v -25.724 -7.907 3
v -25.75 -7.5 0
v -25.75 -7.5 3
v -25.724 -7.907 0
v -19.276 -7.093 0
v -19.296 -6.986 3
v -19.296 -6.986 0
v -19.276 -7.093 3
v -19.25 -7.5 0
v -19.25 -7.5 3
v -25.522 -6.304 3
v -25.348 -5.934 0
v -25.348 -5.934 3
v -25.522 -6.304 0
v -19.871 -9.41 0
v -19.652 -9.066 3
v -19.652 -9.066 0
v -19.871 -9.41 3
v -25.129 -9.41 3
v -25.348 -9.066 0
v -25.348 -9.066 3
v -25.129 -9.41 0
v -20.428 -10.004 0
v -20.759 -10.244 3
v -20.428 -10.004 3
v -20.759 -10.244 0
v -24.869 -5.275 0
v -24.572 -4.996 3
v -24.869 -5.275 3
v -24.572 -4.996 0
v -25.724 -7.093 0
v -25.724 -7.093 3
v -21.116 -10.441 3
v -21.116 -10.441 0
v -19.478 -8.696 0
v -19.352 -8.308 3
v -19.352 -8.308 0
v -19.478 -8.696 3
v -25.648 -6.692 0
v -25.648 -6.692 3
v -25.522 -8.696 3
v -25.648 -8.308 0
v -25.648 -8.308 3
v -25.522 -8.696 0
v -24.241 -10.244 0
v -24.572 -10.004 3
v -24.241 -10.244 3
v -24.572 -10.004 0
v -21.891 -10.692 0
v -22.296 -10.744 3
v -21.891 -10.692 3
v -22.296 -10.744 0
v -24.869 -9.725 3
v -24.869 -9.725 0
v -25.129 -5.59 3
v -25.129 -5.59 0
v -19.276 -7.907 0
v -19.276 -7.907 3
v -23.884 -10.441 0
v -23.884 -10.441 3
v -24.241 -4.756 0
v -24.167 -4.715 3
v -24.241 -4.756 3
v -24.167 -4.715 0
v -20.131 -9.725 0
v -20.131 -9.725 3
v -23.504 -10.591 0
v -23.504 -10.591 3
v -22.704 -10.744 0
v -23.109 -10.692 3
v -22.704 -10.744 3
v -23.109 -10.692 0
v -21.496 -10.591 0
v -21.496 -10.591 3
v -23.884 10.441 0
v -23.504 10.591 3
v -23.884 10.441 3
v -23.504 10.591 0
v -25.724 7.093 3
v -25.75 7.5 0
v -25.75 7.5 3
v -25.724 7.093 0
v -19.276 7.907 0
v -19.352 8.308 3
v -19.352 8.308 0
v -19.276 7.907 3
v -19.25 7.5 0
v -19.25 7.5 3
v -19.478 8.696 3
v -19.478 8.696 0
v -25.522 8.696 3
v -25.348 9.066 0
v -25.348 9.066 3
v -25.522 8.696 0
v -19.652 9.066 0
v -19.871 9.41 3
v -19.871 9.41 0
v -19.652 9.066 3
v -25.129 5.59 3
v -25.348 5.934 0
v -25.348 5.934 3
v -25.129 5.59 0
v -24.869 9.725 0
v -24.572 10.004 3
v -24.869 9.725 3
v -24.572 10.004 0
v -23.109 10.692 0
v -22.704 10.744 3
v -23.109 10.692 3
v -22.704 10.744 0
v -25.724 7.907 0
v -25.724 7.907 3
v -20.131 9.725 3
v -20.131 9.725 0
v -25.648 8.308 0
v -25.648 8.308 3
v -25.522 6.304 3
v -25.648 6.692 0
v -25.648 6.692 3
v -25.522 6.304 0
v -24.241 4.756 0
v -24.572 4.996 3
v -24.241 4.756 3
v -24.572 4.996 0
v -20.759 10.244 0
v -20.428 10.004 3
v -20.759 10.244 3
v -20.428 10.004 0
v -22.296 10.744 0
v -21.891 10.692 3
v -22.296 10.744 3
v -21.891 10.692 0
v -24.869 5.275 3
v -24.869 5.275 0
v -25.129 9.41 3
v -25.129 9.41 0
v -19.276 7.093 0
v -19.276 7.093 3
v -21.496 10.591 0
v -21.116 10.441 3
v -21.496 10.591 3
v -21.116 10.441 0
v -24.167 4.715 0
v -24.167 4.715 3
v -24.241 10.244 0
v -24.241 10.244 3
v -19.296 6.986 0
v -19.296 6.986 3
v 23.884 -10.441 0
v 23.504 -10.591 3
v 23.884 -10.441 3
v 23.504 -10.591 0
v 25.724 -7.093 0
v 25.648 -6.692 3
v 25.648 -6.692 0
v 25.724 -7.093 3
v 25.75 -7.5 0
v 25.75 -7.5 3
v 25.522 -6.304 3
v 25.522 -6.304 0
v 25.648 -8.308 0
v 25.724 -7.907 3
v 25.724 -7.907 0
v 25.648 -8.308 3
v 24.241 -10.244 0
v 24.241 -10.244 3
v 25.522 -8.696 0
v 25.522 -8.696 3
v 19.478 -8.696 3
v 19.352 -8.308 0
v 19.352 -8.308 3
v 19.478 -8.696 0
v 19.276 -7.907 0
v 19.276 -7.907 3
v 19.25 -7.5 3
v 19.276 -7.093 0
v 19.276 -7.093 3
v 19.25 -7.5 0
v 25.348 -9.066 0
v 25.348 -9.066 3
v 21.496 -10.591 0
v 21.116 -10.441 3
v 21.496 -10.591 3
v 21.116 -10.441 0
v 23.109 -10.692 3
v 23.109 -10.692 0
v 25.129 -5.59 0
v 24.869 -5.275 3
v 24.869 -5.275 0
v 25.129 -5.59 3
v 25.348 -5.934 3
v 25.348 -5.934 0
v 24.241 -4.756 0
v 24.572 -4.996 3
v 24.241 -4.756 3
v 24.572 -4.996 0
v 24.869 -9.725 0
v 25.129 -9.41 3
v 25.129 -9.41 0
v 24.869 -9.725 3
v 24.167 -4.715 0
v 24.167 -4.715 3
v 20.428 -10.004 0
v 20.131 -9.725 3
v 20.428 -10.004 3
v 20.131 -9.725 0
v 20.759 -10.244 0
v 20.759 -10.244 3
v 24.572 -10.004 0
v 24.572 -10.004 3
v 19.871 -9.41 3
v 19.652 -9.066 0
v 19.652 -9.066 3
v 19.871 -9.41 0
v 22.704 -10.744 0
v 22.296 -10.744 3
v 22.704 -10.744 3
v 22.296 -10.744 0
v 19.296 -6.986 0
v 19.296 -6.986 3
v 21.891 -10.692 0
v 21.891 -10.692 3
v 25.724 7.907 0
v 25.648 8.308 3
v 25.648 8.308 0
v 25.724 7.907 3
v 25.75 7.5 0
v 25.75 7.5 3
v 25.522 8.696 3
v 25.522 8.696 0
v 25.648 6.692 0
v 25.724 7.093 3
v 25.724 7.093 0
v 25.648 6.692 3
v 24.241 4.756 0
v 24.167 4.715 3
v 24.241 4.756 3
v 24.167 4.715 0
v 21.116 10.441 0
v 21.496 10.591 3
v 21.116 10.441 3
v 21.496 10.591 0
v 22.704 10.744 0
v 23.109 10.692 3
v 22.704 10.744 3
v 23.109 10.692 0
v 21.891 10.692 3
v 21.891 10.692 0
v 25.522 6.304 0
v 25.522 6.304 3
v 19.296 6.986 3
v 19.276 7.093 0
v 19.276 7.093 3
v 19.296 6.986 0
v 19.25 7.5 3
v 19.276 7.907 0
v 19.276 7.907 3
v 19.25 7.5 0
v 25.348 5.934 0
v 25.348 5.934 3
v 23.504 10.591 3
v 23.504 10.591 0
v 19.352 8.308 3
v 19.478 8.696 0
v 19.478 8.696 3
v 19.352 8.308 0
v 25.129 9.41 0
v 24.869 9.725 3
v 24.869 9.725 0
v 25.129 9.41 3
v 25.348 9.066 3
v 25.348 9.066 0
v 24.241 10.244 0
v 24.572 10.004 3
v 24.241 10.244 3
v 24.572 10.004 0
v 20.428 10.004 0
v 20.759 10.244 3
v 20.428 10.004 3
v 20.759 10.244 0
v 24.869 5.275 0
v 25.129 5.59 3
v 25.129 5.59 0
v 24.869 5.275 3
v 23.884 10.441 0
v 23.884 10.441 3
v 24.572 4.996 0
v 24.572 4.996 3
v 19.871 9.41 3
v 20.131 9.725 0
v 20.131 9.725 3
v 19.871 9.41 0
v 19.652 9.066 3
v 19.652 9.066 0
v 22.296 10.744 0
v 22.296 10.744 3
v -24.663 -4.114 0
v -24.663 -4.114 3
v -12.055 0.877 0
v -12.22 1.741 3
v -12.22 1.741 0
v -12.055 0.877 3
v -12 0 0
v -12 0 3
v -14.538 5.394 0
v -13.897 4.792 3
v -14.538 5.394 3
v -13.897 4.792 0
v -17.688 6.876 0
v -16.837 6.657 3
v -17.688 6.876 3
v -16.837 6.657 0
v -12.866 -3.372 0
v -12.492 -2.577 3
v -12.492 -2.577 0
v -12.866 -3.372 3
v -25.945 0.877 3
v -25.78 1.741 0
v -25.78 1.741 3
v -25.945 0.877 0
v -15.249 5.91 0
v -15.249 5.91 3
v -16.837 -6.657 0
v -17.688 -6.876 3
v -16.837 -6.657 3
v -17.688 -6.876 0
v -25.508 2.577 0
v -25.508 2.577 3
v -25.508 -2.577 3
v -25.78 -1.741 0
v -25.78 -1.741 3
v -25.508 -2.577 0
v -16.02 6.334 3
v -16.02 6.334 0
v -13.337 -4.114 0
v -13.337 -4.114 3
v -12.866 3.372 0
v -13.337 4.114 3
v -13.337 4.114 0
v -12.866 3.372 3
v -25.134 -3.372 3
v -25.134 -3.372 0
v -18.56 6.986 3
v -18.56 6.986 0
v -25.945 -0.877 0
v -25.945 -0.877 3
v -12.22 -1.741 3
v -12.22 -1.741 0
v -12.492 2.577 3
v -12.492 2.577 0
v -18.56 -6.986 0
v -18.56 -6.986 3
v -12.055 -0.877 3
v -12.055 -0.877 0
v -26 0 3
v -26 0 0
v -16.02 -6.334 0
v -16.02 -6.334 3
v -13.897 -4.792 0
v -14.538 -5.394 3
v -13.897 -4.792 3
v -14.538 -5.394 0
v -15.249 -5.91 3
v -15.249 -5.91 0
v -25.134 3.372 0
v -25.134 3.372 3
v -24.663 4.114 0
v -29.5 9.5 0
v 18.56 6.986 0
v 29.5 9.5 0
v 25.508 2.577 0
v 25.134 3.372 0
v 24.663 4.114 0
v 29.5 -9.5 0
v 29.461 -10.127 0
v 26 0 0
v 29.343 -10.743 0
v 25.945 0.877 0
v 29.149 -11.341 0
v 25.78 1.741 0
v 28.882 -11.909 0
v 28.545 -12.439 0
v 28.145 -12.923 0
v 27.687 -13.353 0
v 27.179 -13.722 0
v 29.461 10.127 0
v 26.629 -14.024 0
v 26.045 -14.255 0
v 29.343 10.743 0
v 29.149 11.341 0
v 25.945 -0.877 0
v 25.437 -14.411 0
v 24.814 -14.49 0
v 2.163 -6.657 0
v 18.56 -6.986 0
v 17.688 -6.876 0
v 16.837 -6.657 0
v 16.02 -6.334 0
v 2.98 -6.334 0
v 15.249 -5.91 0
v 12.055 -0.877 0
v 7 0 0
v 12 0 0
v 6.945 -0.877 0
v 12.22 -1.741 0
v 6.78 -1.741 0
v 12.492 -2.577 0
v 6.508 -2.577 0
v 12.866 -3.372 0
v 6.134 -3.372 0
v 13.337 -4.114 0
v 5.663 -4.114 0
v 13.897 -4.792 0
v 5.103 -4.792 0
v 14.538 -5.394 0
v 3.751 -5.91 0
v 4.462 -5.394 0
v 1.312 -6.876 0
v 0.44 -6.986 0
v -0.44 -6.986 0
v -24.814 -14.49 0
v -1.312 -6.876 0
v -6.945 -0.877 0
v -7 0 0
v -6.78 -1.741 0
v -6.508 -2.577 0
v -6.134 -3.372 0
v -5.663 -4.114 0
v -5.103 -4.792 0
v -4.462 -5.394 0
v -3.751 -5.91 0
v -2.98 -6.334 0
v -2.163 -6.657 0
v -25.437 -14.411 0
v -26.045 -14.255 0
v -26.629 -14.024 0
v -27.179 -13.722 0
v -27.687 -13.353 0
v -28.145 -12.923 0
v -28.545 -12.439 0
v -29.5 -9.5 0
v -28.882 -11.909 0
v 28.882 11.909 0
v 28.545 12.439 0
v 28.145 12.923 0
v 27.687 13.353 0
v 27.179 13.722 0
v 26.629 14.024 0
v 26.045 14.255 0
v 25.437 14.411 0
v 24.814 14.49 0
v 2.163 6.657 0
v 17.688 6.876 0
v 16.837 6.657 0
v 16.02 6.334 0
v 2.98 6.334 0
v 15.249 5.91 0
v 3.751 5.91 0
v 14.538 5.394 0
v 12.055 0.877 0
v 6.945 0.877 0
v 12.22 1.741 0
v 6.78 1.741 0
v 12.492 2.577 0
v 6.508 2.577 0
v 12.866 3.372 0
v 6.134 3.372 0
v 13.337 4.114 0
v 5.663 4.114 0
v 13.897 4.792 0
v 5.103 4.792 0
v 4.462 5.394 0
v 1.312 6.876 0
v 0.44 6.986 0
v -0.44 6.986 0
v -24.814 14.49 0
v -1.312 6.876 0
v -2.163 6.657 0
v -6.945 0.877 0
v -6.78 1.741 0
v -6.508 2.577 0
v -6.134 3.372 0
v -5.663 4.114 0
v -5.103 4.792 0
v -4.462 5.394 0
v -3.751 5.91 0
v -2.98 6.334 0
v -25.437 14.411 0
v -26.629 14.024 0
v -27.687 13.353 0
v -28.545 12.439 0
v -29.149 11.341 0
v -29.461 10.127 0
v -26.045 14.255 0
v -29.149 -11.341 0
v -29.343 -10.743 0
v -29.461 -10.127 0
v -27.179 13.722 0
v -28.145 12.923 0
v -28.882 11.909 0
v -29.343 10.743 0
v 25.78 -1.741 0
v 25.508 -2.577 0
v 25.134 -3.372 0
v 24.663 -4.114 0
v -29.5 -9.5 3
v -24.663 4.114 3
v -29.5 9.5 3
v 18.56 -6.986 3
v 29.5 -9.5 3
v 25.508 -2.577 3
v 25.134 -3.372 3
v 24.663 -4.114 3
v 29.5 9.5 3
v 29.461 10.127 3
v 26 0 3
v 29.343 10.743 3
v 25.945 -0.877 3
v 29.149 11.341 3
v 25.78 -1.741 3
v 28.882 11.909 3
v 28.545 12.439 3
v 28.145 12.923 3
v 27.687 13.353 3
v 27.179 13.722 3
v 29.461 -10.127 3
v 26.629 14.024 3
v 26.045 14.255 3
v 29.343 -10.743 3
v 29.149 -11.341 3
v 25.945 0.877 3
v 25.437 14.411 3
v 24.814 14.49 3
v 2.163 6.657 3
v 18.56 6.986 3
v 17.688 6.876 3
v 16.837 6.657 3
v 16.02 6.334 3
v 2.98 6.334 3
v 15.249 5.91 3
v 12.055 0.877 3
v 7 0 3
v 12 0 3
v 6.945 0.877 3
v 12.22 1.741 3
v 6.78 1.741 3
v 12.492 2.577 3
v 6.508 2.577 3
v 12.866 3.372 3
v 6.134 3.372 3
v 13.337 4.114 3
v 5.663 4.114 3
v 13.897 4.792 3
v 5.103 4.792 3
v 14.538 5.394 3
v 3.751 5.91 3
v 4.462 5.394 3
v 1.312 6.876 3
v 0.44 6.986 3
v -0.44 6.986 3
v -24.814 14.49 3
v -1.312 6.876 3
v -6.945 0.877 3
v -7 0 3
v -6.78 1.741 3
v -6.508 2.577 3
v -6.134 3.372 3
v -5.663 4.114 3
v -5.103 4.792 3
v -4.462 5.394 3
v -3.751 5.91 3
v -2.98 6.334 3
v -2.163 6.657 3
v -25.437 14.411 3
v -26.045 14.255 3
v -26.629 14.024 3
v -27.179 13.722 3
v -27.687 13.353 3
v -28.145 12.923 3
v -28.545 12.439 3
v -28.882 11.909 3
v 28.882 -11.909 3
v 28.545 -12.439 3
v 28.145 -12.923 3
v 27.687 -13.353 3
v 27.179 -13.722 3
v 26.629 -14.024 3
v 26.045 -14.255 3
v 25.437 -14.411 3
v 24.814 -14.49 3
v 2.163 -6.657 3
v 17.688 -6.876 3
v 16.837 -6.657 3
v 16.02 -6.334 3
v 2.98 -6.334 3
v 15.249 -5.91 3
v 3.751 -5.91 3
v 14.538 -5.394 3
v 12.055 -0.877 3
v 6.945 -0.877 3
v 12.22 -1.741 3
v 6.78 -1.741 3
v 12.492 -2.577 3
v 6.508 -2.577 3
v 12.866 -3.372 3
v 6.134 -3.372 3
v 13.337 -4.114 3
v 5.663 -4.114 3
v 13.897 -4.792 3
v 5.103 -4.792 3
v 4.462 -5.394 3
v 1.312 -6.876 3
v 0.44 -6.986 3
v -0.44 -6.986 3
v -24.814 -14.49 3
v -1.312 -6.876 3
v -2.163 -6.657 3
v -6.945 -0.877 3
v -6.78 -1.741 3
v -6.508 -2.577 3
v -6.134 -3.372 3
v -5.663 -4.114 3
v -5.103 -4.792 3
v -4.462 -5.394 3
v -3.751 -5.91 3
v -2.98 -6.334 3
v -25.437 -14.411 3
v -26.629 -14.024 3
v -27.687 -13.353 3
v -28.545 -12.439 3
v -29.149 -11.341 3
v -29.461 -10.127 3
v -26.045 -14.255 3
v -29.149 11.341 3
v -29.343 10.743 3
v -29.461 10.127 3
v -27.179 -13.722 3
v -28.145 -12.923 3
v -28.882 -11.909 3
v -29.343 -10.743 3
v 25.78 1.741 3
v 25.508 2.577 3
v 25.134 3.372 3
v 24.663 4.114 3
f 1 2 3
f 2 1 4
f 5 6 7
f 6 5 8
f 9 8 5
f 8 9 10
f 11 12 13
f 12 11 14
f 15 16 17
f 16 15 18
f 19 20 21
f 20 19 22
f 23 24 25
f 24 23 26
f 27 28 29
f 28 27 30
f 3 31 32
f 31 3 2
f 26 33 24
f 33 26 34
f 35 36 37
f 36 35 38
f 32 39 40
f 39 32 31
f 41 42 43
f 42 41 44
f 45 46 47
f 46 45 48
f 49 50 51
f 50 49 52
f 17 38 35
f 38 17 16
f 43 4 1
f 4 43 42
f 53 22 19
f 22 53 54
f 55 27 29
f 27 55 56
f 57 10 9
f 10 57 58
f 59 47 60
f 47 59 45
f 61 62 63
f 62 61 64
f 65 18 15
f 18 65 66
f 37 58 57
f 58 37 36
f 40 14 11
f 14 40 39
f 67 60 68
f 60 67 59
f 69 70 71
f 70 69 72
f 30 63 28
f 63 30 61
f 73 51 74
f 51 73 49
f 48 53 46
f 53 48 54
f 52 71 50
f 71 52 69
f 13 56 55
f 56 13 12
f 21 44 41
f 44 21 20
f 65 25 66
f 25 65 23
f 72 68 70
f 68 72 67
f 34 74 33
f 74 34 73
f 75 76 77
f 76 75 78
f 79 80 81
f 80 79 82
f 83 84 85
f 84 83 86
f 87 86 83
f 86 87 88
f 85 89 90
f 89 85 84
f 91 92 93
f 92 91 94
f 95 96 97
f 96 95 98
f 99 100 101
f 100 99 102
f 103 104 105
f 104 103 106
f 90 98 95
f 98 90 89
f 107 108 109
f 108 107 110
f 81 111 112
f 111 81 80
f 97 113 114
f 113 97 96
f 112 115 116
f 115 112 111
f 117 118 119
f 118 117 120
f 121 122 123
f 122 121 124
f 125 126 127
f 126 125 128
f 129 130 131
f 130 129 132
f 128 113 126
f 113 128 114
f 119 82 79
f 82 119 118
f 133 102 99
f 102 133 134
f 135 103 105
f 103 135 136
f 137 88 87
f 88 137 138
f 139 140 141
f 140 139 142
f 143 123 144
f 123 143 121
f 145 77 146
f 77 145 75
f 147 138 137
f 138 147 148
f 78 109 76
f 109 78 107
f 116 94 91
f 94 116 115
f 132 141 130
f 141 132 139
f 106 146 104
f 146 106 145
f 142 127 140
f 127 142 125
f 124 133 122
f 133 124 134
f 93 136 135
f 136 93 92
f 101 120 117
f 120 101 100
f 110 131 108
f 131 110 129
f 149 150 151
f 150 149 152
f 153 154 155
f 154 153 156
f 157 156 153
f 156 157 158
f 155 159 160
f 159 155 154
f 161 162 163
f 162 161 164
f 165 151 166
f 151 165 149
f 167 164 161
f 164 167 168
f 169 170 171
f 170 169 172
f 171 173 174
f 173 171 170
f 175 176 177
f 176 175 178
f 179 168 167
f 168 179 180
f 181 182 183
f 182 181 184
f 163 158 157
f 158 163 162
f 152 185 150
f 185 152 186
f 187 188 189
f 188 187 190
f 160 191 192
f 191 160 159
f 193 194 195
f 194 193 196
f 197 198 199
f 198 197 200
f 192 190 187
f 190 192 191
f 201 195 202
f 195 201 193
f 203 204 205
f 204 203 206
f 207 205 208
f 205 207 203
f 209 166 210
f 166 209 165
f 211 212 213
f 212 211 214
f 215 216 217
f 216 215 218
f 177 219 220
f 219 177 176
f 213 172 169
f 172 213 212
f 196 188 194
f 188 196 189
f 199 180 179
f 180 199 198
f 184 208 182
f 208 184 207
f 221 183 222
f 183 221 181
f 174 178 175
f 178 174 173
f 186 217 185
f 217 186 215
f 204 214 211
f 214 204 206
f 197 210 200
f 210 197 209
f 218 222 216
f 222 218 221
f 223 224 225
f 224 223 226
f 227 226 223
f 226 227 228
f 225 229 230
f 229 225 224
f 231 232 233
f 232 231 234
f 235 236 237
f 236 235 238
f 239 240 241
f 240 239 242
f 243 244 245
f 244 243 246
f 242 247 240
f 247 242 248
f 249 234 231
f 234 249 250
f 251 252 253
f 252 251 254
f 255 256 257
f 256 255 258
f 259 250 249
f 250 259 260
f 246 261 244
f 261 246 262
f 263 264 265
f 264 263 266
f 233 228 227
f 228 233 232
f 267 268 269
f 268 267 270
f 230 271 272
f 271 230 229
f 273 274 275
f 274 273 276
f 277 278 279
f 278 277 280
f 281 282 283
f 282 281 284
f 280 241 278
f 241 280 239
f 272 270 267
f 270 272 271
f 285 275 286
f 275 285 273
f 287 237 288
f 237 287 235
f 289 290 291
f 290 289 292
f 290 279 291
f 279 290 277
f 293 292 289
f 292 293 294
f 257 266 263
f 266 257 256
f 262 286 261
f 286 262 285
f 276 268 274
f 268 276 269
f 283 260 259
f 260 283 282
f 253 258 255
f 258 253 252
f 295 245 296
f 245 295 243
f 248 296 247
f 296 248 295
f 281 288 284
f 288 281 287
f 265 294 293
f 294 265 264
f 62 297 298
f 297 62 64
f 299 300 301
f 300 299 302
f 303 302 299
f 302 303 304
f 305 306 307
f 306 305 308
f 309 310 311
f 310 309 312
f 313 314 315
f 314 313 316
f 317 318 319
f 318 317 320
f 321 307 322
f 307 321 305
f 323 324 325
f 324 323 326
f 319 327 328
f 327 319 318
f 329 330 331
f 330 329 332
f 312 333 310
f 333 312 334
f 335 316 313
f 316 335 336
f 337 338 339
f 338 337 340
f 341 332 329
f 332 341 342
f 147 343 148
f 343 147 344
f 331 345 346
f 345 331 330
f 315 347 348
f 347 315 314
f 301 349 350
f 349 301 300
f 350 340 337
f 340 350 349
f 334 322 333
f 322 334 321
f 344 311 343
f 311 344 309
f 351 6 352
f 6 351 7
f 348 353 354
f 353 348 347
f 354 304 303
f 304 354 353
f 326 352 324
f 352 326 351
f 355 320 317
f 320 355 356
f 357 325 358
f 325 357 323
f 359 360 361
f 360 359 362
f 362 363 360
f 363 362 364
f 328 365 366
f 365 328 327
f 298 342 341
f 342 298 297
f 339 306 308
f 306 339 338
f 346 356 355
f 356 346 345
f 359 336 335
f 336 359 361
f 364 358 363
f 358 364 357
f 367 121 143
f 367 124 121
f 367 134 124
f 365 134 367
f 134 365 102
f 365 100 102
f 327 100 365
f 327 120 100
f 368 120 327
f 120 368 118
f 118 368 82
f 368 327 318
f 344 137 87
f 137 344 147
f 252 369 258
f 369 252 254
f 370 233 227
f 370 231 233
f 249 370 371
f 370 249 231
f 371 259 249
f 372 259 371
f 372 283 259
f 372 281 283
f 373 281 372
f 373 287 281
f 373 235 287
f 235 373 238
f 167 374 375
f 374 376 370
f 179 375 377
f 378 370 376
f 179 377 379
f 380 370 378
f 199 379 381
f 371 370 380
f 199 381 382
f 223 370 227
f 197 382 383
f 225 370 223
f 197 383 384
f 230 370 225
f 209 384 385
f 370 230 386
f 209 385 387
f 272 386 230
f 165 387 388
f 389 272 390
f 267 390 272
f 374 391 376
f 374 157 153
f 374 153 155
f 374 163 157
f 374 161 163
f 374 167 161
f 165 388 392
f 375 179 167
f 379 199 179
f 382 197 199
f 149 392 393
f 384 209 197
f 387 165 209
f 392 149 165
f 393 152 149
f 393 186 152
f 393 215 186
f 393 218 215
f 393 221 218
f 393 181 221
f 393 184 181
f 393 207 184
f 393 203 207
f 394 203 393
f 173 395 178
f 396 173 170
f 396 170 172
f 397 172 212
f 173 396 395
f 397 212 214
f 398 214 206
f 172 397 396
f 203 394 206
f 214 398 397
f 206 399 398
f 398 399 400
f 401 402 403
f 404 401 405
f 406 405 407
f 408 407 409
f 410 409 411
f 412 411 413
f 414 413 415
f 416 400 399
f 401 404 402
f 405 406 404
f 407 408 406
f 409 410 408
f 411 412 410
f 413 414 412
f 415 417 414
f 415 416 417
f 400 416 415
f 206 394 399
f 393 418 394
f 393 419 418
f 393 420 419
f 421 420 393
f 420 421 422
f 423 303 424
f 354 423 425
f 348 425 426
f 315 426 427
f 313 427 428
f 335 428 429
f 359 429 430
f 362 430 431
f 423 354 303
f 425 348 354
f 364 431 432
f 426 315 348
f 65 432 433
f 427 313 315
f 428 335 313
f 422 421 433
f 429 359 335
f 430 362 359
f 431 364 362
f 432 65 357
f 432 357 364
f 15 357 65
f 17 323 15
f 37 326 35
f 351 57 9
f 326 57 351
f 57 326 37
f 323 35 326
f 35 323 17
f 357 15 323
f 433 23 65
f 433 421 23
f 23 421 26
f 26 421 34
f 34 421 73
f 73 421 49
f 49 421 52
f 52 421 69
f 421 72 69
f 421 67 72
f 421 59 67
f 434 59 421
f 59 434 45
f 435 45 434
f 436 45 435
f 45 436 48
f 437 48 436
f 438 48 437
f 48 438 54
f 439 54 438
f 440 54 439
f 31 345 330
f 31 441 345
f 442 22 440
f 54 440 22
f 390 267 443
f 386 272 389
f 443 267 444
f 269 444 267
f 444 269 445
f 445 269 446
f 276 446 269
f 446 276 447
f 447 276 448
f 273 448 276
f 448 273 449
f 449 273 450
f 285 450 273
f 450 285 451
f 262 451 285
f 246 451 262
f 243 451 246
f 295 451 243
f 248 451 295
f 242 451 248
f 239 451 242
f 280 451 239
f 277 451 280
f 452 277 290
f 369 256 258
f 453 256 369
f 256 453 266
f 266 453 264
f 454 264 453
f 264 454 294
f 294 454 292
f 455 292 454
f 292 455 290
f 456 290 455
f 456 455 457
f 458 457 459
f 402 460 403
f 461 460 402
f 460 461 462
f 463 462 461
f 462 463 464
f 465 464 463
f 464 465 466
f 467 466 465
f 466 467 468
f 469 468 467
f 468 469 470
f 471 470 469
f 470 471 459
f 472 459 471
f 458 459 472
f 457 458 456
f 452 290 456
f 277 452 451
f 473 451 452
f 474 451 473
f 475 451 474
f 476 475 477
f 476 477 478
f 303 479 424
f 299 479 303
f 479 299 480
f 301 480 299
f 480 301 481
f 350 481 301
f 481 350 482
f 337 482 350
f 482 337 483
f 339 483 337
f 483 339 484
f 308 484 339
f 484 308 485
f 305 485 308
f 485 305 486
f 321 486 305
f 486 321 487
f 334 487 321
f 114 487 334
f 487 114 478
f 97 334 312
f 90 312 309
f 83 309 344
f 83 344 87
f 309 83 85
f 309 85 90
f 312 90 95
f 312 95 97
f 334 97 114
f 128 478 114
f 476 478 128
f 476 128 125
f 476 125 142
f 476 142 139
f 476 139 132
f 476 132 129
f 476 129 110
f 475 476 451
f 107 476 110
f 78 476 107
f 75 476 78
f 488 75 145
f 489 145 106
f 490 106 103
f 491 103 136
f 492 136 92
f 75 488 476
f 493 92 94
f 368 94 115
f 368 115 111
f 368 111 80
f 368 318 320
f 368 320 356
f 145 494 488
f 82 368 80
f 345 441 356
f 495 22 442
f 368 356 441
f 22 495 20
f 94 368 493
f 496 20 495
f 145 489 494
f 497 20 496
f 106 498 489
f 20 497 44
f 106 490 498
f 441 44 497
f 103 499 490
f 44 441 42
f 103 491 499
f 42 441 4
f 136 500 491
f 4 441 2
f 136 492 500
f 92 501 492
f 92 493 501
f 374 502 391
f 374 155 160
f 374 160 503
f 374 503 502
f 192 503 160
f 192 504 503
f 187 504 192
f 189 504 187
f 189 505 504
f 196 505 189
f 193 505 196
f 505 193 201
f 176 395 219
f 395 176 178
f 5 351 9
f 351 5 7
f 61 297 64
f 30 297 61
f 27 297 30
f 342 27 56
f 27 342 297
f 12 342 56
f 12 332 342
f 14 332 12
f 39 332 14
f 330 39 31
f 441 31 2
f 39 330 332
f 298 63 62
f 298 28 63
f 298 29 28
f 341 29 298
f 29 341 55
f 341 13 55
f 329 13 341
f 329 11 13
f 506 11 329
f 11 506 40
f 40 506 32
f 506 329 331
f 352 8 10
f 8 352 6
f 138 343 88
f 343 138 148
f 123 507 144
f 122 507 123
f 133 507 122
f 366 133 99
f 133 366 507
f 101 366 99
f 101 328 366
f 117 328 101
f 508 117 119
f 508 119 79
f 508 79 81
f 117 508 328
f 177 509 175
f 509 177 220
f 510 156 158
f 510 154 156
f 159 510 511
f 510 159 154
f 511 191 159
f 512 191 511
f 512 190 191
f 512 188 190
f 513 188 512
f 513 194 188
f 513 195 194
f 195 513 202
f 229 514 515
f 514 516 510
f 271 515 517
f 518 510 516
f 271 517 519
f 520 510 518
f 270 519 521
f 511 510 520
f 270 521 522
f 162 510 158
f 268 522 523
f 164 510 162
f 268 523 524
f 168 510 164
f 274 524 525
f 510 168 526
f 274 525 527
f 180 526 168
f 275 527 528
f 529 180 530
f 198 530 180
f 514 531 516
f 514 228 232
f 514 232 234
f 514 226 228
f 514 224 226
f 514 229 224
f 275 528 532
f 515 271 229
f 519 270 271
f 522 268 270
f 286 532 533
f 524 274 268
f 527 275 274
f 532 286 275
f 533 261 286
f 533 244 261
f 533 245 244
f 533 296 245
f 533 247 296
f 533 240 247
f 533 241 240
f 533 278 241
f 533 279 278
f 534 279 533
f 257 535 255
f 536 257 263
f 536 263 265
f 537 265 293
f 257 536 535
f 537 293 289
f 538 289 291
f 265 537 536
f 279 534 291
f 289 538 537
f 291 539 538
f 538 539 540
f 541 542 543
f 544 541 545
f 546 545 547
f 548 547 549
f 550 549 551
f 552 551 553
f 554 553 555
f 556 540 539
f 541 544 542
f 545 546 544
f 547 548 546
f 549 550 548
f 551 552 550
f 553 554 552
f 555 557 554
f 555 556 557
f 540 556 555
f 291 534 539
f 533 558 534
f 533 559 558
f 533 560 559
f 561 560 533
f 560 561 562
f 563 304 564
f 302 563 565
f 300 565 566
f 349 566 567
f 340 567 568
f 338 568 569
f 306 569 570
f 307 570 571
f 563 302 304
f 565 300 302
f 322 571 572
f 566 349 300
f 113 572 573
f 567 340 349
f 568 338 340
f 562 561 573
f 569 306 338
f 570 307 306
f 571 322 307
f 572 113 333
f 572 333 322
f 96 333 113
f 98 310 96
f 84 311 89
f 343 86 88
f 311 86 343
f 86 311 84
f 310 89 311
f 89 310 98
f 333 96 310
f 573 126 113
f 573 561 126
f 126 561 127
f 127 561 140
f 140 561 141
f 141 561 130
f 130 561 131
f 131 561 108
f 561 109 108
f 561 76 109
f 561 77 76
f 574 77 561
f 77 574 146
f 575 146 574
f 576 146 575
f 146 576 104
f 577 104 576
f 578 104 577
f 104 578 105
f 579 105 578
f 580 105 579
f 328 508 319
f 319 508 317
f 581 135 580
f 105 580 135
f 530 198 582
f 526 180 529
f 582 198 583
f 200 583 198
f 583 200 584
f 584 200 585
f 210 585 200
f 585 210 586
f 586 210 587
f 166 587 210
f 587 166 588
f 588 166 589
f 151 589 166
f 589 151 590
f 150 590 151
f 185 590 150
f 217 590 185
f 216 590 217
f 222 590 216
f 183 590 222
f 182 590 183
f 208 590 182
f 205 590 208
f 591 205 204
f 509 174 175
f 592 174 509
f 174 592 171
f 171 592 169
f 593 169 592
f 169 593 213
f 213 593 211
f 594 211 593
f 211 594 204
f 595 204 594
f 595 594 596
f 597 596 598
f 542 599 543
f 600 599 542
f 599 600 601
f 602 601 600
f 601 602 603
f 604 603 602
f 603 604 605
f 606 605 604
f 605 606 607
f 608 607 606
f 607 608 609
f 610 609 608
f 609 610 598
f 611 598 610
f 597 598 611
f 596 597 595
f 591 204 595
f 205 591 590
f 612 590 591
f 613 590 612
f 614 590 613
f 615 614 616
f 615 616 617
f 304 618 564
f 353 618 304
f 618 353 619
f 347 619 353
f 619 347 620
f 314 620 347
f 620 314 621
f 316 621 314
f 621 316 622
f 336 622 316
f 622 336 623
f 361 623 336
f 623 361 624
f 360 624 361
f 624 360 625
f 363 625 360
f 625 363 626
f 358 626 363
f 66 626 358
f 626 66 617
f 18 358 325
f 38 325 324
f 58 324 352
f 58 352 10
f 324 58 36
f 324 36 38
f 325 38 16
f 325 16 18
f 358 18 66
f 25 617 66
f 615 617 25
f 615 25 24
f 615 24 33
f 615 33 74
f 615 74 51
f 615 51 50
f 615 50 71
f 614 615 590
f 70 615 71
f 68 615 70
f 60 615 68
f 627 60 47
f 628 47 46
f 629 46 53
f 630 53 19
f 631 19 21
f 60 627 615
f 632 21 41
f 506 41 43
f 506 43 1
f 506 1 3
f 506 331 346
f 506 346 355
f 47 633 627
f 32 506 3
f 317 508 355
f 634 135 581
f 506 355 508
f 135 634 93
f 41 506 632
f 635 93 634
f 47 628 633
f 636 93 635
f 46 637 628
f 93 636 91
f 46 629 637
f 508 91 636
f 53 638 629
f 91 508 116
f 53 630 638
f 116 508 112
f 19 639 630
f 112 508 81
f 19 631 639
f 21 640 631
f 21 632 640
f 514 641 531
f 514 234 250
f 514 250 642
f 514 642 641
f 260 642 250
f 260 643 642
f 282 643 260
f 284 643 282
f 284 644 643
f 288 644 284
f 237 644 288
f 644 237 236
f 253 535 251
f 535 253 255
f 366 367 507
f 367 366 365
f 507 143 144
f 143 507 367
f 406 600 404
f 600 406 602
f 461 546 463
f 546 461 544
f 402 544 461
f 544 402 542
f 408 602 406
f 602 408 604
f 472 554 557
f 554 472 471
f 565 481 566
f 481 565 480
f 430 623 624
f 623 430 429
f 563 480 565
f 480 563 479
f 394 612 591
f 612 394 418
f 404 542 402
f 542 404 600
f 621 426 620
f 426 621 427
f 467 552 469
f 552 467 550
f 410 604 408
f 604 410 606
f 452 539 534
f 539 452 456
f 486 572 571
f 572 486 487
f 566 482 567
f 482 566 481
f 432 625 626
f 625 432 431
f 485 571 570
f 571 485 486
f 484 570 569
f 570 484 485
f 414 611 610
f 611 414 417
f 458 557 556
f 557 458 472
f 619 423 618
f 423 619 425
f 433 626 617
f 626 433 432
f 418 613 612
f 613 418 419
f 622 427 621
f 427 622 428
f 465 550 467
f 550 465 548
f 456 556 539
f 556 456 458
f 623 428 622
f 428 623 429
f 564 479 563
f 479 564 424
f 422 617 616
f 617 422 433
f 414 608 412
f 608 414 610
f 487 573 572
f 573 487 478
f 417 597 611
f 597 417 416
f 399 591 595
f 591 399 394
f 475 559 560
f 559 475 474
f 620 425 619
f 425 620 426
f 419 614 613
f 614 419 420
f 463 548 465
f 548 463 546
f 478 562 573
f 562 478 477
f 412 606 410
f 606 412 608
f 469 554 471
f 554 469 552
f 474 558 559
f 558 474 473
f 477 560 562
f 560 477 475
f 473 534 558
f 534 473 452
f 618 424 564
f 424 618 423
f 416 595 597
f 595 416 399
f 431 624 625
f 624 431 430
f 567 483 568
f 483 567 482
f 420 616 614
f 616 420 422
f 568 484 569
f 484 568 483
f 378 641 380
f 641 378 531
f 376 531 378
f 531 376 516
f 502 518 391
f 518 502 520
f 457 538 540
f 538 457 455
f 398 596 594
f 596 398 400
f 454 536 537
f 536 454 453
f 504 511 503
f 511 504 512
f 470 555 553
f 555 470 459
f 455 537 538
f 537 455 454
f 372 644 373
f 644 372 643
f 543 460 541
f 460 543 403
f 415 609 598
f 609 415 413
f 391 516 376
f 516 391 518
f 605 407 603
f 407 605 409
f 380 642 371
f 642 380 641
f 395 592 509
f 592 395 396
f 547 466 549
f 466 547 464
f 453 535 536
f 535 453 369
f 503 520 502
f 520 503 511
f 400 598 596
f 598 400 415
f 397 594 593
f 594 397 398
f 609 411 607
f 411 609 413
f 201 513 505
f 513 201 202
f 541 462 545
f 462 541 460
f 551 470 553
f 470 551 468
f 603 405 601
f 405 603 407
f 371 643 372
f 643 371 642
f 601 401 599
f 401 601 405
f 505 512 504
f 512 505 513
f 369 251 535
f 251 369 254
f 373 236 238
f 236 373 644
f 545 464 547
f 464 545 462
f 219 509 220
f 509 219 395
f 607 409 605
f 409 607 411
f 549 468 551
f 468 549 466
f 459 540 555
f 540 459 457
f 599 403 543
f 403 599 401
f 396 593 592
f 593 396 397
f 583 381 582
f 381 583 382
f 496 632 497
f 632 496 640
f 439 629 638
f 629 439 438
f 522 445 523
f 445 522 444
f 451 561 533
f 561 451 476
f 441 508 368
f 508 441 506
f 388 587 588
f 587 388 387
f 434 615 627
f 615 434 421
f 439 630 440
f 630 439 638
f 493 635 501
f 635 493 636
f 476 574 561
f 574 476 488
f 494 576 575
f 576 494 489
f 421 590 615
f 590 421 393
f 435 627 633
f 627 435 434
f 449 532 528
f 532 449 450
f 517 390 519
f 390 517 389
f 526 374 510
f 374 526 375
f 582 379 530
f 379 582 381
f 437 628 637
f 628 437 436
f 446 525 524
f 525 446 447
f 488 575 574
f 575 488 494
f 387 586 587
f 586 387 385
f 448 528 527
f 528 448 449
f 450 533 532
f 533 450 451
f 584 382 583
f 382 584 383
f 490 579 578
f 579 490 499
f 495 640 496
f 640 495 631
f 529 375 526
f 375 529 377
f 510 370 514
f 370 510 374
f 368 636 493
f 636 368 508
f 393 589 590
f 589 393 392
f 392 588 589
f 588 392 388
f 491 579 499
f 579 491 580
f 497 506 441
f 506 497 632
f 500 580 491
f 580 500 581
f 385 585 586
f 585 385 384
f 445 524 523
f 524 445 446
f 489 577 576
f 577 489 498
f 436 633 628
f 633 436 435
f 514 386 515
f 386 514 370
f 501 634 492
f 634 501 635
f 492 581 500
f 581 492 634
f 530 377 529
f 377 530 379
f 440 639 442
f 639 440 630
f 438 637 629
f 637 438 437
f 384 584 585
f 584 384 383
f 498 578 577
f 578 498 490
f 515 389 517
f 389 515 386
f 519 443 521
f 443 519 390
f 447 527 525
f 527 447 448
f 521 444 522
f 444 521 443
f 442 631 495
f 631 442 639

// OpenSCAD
$fn = 50;

difference() {
	union() {
		hull() {
			translate(v = [-24.5, 9.5, 0]) {
				cylinder(h = 3, r = 5);
			}
			translate(v = [24.5, 9.5, 0]) {
				cylinder(h = 3, r = 5);
			}
			translate(v = [-24.5, -9.5, 0]) {
				cylinder(h = 3, r = 5);
			}
			translate(v = [24.5, -9.5, 0]) {
				cylinder(h = 3, r = 5);
			}
		}
	}
	union() {
		translate(v = [-22.5, -7.5, -100.0]) {
			cylinder(h = 200, r = 3.25);
		}
		translate(v = [-22.5, 7.5, -100.0]) {
			cylinder(h = 200, r = 3.25);
		}
		translate(v = [22.5, -7.5, -100.0]) {
			cylinder(h = 200, r = 3.25);
		}
		translate(v = [22.5, 7.5, -100.0]) {
			cylinder(h = 200, r = 3.25);
		}
		translate(v = [-22.5, -7.5, -100.0]) {
			cylinder(h = 200, r = 1.8);
		}
		translate(v = [-22.5, 7.5, -100.0]) {
			cylinder(h = 200, r = 1.8);
		}
		translate(v = [22.5, -7.5, -100.0]) {
			cylinder(h = 200, r = 1.8);
		}
		translate(v = [22.5, 7.5, -100.0]) {
			cylinder(h = 200, r = 1.8);
		}
		translate(v = [-19.0, 0, 0.0]) {
			cylinder(h = 3, r = 7.0);
		}
		cylinder(h = 3, r = 7.0);
		translate(v = [19.0, 0, 0.0]) {
			cylinder(h = 3, r = 7.0);
		}
	}
}
